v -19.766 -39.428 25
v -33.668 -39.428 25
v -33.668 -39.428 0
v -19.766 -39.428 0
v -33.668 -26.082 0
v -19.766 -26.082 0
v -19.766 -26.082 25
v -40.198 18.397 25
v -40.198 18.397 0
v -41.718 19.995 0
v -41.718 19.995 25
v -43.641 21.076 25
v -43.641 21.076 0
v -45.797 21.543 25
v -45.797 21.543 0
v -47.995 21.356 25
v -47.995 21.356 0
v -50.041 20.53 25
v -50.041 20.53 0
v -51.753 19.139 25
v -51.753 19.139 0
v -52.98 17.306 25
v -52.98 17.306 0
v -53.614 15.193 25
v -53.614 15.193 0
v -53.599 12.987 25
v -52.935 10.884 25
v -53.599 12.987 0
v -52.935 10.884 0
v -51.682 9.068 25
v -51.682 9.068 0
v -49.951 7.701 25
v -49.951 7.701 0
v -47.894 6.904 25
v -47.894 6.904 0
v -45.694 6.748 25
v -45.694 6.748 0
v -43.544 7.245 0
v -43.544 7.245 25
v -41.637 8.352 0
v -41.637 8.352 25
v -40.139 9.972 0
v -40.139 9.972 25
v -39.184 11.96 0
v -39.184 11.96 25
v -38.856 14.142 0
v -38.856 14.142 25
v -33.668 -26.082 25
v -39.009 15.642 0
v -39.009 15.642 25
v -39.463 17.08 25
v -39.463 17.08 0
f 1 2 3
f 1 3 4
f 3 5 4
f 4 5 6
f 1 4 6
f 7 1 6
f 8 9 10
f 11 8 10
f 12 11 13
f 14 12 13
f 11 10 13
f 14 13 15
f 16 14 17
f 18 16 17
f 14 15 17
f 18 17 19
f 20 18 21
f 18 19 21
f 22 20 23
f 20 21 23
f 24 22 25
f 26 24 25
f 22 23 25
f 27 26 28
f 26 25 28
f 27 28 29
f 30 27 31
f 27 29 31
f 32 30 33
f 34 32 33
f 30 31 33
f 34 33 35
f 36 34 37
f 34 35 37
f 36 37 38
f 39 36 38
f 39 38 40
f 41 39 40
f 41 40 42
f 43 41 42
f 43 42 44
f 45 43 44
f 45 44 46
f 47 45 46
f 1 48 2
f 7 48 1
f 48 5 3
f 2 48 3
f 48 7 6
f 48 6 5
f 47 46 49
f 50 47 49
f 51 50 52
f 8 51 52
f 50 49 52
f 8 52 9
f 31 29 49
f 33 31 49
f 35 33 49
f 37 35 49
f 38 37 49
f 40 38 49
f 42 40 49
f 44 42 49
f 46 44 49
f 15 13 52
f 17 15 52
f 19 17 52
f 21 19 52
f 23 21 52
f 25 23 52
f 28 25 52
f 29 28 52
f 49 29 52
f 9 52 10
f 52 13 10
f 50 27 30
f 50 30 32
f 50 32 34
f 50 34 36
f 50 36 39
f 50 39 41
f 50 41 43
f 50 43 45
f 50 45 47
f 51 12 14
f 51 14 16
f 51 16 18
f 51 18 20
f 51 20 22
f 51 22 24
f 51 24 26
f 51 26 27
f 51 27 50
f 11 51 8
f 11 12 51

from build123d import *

# Parameters (mm, degrees)
F1_DEPTH = 25


with BuildPart() as f1:
    # F0 (on Top) → F1 (new body)
    with BuildSketch(Plane.XY):
        with BuildLine():
            ThreePointArc((-38.8557095999, 14.1416667029), (-39.1992092506, 16.3726617141), (-40.197890669, 18.3970051075))
            ThreePointArc((-40.197890669, 18.3970051075), (-53.3457934483, 11.9106716918), (-38.8557095999, 14.1416667029))
        make_face()
    extrude(amount=F1_DEPTH)


with BuildPart() as f1b:
    # F0 (on Top) → F1, piece 2 (new body)
    with BuildSketch(Plane.XY):
        Polygon((-19.7657570243, -26.0818563402), (-26.994869113, -26.0818563402), (-33.6678959429, -26.0818563402), (-33.6678959429, -39.42791), (-19.7657570243, -39.42791), align=None)
    extrude(amount=F1_DEPTH)


solid = Compound([f1.part, f1b.part])
